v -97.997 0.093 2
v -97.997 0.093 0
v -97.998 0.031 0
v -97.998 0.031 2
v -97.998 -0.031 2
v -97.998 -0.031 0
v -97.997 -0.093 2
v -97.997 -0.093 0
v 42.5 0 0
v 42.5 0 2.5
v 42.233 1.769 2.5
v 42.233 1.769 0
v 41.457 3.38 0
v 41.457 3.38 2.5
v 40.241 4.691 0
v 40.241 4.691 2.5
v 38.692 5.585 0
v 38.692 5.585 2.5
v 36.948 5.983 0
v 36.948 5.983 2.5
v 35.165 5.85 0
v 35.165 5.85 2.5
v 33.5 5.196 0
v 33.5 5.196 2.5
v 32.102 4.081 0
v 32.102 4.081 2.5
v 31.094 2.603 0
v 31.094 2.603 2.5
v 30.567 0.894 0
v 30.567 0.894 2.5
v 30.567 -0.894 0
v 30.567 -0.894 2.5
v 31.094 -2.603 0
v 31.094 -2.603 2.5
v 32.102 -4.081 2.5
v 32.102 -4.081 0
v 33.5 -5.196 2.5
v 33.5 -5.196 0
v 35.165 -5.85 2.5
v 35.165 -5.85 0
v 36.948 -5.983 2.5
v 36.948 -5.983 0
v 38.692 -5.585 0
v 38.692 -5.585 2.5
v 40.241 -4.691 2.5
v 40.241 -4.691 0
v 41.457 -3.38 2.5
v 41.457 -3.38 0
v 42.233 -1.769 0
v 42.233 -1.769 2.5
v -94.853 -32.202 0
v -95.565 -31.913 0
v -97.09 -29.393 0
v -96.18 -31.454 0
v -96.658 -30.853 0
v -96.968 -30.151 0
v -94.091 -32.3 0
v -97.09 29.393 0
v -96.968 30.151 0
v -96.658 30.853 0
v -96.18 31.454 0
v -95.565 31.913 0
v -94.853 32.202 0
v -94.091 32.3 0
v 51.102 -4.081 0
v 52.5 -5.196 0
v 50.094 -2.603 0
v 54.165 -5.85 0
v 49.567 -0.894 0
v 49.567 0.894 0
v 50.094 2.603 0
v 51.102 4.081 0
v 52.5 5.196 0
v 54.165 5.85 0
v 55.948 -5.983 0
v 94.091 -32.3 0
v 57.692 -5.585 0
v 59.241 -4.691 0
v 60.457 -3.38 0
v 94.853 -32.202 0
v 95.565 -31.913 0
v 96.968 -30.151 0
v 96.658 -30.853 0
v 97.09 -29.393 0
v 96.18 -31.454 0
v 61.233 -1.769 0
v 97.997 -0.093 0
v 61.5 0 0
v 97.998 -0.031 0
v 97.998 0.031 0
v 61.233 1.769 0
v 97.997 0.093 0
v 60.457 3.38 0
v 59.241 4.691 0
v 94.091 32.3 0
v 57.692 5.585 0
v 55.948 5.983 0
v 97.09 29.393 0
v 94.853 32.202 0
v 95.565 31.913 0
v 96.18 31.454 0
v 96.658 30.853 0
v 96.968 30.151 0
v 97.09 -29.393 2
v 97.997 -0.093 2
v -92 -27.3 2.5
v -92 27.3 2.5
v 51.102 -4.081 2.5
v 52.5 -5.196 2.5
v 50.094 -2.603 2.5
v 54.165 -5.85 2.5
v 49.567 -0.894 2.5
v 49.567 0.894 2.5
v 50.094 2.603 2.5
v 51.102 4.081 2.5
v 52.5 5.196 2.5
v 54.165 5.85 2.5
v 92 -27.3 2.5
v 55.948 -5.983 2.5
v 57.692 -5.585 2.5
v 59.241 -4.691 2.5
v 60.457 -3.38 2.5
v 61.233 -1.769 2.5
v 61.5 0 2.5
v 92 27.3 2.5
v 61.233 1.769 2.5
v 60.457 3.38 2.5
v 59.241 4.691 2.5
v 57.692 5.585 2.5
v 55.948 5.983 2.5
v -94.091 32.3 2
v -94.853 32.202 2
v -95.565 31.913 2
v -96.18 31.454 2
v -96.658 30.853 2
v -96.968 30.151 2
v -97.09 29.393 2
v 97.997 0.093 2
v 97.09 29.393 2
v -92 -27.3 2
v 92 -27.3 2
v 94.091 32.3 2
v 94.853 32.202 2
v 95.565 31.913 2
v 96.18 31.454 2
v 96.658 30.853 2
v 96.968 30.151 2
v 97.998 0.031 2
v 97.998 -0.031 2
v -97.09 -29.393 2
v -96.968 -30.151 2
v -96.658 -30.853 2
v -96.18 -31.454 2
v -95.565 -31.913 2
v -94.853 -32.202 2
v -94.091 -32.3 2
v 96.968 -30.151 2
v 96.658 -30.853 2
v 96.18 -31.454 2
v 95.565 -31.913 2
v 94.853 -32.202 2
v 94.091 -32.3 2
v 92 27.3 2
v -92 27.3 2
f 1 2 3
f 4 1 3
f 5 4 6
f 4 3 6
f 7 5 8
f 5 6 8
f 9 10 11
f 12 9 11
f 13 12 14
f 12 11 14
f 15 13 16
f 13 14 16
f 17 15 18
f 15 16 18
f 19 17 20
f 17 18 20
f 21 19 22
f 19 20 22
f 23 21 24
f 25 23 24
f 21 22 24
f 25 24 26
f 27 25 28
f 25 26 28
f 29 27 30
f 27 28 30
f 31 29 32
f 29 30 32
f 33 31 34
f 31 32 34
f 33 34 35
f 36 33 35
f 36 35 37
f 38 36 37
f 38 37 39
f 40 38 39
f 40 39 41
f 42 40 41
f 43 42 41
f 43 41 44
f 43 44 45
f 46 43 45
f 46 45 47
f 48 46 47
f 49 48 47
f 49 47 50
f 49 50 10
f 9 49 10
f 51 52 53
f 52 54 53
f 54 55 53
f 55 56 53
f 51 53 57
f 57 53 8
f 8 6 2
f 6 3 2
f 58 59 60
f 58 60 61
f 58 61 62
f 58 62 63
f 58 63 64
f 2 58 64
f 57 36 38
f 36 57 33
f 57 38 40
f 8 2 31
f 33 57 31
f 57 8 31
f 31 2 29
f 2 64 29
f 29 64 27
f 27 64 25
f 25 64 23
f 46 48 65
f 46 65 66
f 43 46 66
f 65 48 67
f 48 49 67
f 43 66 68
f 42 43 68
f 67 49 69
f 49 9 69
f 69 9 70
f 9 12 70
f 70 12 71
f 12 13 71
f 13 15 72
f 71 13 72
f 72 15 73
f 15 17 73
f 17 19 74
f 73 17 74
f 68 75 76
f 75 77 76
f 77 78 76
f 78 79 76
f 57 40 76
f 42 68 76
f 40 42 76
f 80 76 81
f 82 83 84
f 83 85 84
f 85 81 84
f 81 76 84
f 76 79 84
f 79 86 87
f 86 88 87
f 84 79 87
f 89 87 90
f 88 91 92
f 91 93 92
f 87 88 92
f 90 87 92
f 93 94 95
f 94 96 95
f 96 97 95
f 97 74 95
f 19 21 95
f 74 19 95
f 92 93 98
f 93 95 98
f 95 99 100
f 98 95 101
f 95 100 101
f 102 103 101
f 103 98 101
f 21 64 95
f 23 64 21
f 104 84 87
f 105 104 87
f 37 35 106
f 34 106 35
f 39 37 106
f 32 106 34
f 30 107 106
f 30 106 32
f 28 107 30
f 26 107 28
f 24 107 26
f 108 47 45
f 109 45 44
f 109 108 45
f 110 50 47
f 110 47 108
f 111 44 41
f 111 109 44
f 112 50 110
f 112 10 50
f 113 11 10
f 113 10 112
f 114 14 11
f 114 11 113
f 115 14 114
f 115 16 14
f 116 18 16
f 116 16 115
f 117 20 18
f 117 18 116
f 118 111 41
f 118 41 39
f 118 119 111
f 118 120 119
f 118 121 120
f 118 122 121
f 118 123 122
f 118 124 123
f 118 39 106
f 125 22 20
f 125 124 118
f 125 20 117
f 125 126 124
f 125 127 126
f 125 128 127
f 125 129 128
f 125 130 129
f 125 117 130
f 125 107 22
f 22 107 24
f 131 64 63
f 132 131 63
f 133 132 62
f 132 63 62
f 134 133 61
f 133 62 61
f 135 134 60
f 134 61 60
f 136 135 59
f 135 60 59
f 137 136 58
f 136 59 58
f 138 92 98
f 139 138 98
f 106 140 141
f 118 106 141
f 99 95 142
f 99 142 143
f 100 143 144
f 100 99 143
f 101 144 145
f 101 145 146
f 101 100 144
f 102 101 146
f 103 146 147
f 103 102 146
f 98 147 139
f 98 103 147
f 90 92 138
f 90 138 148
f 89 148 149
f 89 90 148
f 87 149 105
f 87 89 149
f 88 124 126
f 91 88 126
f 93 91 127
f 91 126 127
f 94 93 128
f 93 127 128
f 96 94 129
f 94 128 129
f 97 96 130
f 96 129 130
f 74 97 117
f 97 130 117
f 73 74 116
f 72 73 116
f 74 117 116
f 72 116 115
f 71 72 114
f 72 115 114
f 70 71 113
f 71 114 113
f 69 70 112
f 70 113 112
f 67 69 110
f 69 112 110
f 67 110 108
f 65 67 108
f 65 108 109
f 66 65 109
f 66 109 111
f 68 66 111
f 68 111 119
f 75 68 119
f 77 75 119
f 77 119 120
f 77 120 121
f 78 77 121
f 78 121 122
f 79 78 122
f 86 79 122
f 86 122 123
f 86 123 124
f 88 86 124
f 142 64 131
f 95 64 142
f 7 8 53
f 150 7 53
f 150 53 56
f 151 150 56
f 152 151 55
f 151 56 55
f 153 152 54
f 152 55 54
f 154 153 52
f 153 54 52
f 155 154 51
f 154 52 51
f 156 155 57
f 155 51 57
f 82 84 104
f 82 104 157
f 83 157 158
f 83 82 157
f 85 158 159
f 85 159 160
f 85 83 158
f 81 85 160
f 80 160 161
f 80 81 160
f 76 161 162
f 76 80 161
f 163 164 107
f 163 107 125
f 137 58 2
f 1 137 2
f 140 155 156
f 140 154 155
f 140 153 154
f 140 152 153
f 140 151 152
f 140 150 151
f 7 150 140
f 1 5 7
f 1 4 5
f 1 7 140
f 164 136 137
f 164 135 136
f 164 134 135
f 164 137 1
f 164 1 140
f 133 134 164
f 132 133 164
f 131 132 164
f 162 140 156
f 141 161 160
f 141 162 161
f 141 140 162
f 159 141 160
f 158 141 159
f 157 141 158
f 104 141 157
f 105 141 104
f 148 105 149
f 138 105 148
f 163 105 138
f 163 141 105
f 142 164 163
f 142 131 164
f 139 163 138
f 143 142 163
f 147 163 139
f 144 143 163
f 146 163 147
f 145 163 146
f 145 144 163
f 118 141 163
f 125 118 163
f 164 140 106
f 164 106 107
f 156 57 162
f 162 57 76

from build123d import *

# Parameters (mm, degrees)
F0_W        = 194
F0_H        = 64.6
F1_DEPTH    = 2
F2_W        = 184
F2_H        = 54.6
F3_DEPTH    = 0.5
F4_R        = 6
F5_DEPTH    = 25
F6_T1_DEPTH = 16.5427907903
F6_T3_DEPTH = 2.4643962848


# Not quite as in the source:
# - a fillet or chamfer that OpenCascade refuses, or shapes differently, is made with other operations: its cross-section is extruded or revolved along the edge and cut away or added


with BuildPart() as f1:
    # F0 (on Top) → F1 (new body)
    with BuildSketch(Plane.XY):
        Rectangle(F0_W, F0_H)
        Polygon((98, 0), (97, 32.3), (97, -32.3), align=None)
        Polygon((-97, -32.3), (-97, 32.3), (-98, 0), align=None)
    extrude(amount=F1_DEPTH)

    # F2 (on face) → F3 (join)
    with BuildSketch(Plane.XY.offset(2)):
        Rectangle(F2_W, F2_H)
    extrude(amount=F3_DEPTH)

    # F4 (on face) → F5 (cut)
    with BuildSketch(Plane.XY.offset(2.5)):
        with Locations((36.5, 0)):
            Circle(F4_R)
        with Locations((55.5, 0)):
            Circle(F4_R)
    extrude(amount=-F5_DEPTH, mode=Mode.SUBTRACT)

    # F6: fillet of radius 3 on 6 edges, made by hand

    # F6_s2 → F6_t1 (cut)
    with BuildSketch(Plane.XY.offset(-7.2713953952)):
        with BuildLine():
            ThreePointArc((97.0900051153, -29.3928347763), (96.1796822102, -31.4538923289), (94.0914418419, -32.3))
            Line((94.0914418419, -32.3), (97, -32.3))
            Line((97, -32.3), (97.0900051153, -29.3928347763))
        make_face()
        with BuildLine():
            ThreePointArc((94.0914418419, 32.3), (96.1796822102, 31.4538923289), (97.0900051153, 29.3928347763))
            Line((97.0900051153, 29.3928347763), (97, 32.3))
            Line((97, 32.3), (94.0914418419, 32.3))
        make_face()
        with BuildLine():
            ThreePointArc((-94.0914418419, 32.3), (-96.1796822102, 31.4538923289), (-97.0900051153, 29.3928347763))
            Line((-97.0900051153, 29.3928347763), (-97, 32.3))
            Line((-97, 32.3), (-94.0914418419, 32.3))
        make_face()
        with BuildLine():
            ThreePointArc((-97.0900051153, -29.3928347763), (-96.1796822102, -31.4538923289), (-94.0914418419, -32.3))
            Line((-94.0914418419, -32.3), (-97, -32.3))
            Line((-97, -32.3), (-97.0900051153, -29.3928347763))
        make_face()
    extrude(amount=F6_T1_DEPTH, mode=Mode.SUBTRACT)

    # F6_s4 → F6_t3 (cut)
    with BuildSketch(Plane.XY.offset(-0.2321981424)):
        with BuildLine():
            ThreePointArc((-97.9971258583, 0.0928347763), (-97.998562585, 0), (-97.9971258583, -0.0928347763))
            Line((-97.9971258583, -0.0928347763), (-98, 0))
            Line((-98, 0), (-97.9971258583, 0.0928347763))
        make_face()
        with BuildLine():
            ThreePointArc((97.9971258583, 0.0928347763), (97.998562585, 0), (97.9971258583, -0.0928347763))
            Line((97.9971258583, -0.0928347763), (98, 0))
            Line((98, 0), (97.9971258583, 0.0928347763))
        make_face()
    extrude(amount=F6_T3_DEPTH, mode=Mode.SUBTRACT)


solid = f1.part
